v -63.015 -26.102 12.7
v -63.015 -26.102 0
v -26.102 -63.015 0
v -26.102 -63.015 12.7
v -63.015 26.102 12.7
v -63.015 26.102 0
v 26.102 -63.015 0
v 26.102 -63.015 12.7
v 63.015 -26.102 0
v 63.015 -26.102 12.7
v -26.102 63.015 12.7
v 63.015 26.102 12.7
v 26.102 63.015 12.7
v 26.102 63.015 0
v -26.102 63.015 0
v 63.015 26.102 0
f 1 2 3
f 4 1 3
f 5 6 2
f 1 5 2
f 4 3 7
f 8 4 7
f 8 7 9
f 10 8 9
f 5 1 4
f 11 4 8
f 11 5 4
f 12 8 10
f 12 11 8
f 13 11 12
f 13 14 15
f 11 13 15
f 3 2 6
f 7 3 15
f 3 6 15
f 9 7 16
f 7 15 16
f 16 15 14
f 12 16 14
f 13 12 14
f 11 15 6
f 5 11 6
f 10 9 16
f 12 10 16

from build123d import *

# Parameters (mm, degrees)
F1_DEPTH = 12.7


with BuildPart() as f1:
    # F0 (on Top) → F1 (new body)
    with BuildSketch(Plane.XY):
        Polygon((-26.101787, -63.015288), (0, 0), (-63.015288, -26.101787), align=None)
        Polygon((26.101787, 63.015288), (-26.101787, 63.015288), (0, 0), align=None)
        Polygon((63.015288, 26.101787), (26.101787, 63.015288), (0, 0), align=None)
        Polygon((63.015288, 26.101787), (0, 0), (63.015288, -26.101787), align=None)
        Polygon((63.015288, -26.101787), (0, 0), (26.101787, -63.015288), align=None)
        Polygon((26.101787, -63.015288), (0, 0), (-26.101787, -63.015288), align=None)
        Polygon((0, 0), (-63.015288, 26.101787), (-63.015288, -26.101787), align=None)
        Polygon((0, 0), (-26.101787, 63.015288), (-63.015288, 26.101787), align=None)
    extrude(amount=F1_DEPTH)


solid = f1.part
